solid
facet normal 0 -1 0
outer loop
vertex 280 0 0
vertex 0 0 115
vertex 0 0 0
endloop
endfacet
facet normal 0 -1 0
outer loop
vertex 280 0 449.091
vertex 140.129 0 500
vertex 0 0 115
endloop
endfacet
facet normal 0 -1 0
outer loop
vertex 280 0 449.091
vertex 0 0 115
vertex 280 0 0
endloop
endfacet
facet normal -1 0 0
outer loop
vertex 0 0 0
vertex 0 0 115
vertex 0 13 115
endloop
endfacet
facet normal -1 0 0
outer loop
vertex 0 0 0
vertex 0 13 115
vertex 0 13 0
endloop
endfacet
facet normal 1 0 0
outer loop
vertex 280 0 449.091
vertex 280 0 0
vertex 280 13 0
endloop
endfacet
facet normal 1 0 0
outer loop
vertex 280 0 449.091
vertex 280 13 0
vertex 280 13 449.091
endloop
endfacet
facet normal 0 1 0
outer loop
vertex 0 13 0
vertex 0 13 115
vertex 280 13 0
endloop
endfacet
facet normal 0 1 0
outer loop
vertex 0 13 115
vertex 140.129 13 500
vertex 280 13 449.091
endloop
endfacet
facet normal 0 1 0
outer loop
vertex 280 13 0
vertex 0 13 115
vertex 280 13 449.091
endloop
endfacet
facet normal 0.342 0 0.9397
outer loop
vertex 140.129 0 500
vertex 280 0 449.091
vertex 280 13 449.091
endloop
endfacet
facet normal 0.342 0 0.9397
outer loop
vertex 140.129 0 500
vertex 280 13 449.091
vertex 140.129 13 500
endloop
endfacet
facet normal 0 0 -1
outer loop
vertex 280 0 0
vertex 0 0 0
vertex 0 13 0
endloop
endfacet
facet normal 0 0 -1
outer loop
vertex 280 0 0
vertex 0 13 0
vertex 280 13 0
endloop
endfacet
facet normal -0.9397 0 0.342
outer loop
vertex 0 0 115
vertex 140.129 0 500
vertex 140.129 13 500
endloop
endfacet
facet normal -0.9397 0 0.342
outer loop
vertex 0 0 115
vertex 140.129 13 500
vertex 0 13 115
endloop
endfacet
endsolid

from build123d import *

# Parameters (mm, degrees)
PAD_DEPTH = 13


with BuildPart() as part:
    # Sketch → Pad (new body)
    with BuildSketch(Plane.XZ):
        Polygon((0, 0), (280, 0), (280, 449.090952), (140.12854, 500), (0, 115), align=None)
    extrude(amount=-PAD_DEPTH)


solid = part.part
